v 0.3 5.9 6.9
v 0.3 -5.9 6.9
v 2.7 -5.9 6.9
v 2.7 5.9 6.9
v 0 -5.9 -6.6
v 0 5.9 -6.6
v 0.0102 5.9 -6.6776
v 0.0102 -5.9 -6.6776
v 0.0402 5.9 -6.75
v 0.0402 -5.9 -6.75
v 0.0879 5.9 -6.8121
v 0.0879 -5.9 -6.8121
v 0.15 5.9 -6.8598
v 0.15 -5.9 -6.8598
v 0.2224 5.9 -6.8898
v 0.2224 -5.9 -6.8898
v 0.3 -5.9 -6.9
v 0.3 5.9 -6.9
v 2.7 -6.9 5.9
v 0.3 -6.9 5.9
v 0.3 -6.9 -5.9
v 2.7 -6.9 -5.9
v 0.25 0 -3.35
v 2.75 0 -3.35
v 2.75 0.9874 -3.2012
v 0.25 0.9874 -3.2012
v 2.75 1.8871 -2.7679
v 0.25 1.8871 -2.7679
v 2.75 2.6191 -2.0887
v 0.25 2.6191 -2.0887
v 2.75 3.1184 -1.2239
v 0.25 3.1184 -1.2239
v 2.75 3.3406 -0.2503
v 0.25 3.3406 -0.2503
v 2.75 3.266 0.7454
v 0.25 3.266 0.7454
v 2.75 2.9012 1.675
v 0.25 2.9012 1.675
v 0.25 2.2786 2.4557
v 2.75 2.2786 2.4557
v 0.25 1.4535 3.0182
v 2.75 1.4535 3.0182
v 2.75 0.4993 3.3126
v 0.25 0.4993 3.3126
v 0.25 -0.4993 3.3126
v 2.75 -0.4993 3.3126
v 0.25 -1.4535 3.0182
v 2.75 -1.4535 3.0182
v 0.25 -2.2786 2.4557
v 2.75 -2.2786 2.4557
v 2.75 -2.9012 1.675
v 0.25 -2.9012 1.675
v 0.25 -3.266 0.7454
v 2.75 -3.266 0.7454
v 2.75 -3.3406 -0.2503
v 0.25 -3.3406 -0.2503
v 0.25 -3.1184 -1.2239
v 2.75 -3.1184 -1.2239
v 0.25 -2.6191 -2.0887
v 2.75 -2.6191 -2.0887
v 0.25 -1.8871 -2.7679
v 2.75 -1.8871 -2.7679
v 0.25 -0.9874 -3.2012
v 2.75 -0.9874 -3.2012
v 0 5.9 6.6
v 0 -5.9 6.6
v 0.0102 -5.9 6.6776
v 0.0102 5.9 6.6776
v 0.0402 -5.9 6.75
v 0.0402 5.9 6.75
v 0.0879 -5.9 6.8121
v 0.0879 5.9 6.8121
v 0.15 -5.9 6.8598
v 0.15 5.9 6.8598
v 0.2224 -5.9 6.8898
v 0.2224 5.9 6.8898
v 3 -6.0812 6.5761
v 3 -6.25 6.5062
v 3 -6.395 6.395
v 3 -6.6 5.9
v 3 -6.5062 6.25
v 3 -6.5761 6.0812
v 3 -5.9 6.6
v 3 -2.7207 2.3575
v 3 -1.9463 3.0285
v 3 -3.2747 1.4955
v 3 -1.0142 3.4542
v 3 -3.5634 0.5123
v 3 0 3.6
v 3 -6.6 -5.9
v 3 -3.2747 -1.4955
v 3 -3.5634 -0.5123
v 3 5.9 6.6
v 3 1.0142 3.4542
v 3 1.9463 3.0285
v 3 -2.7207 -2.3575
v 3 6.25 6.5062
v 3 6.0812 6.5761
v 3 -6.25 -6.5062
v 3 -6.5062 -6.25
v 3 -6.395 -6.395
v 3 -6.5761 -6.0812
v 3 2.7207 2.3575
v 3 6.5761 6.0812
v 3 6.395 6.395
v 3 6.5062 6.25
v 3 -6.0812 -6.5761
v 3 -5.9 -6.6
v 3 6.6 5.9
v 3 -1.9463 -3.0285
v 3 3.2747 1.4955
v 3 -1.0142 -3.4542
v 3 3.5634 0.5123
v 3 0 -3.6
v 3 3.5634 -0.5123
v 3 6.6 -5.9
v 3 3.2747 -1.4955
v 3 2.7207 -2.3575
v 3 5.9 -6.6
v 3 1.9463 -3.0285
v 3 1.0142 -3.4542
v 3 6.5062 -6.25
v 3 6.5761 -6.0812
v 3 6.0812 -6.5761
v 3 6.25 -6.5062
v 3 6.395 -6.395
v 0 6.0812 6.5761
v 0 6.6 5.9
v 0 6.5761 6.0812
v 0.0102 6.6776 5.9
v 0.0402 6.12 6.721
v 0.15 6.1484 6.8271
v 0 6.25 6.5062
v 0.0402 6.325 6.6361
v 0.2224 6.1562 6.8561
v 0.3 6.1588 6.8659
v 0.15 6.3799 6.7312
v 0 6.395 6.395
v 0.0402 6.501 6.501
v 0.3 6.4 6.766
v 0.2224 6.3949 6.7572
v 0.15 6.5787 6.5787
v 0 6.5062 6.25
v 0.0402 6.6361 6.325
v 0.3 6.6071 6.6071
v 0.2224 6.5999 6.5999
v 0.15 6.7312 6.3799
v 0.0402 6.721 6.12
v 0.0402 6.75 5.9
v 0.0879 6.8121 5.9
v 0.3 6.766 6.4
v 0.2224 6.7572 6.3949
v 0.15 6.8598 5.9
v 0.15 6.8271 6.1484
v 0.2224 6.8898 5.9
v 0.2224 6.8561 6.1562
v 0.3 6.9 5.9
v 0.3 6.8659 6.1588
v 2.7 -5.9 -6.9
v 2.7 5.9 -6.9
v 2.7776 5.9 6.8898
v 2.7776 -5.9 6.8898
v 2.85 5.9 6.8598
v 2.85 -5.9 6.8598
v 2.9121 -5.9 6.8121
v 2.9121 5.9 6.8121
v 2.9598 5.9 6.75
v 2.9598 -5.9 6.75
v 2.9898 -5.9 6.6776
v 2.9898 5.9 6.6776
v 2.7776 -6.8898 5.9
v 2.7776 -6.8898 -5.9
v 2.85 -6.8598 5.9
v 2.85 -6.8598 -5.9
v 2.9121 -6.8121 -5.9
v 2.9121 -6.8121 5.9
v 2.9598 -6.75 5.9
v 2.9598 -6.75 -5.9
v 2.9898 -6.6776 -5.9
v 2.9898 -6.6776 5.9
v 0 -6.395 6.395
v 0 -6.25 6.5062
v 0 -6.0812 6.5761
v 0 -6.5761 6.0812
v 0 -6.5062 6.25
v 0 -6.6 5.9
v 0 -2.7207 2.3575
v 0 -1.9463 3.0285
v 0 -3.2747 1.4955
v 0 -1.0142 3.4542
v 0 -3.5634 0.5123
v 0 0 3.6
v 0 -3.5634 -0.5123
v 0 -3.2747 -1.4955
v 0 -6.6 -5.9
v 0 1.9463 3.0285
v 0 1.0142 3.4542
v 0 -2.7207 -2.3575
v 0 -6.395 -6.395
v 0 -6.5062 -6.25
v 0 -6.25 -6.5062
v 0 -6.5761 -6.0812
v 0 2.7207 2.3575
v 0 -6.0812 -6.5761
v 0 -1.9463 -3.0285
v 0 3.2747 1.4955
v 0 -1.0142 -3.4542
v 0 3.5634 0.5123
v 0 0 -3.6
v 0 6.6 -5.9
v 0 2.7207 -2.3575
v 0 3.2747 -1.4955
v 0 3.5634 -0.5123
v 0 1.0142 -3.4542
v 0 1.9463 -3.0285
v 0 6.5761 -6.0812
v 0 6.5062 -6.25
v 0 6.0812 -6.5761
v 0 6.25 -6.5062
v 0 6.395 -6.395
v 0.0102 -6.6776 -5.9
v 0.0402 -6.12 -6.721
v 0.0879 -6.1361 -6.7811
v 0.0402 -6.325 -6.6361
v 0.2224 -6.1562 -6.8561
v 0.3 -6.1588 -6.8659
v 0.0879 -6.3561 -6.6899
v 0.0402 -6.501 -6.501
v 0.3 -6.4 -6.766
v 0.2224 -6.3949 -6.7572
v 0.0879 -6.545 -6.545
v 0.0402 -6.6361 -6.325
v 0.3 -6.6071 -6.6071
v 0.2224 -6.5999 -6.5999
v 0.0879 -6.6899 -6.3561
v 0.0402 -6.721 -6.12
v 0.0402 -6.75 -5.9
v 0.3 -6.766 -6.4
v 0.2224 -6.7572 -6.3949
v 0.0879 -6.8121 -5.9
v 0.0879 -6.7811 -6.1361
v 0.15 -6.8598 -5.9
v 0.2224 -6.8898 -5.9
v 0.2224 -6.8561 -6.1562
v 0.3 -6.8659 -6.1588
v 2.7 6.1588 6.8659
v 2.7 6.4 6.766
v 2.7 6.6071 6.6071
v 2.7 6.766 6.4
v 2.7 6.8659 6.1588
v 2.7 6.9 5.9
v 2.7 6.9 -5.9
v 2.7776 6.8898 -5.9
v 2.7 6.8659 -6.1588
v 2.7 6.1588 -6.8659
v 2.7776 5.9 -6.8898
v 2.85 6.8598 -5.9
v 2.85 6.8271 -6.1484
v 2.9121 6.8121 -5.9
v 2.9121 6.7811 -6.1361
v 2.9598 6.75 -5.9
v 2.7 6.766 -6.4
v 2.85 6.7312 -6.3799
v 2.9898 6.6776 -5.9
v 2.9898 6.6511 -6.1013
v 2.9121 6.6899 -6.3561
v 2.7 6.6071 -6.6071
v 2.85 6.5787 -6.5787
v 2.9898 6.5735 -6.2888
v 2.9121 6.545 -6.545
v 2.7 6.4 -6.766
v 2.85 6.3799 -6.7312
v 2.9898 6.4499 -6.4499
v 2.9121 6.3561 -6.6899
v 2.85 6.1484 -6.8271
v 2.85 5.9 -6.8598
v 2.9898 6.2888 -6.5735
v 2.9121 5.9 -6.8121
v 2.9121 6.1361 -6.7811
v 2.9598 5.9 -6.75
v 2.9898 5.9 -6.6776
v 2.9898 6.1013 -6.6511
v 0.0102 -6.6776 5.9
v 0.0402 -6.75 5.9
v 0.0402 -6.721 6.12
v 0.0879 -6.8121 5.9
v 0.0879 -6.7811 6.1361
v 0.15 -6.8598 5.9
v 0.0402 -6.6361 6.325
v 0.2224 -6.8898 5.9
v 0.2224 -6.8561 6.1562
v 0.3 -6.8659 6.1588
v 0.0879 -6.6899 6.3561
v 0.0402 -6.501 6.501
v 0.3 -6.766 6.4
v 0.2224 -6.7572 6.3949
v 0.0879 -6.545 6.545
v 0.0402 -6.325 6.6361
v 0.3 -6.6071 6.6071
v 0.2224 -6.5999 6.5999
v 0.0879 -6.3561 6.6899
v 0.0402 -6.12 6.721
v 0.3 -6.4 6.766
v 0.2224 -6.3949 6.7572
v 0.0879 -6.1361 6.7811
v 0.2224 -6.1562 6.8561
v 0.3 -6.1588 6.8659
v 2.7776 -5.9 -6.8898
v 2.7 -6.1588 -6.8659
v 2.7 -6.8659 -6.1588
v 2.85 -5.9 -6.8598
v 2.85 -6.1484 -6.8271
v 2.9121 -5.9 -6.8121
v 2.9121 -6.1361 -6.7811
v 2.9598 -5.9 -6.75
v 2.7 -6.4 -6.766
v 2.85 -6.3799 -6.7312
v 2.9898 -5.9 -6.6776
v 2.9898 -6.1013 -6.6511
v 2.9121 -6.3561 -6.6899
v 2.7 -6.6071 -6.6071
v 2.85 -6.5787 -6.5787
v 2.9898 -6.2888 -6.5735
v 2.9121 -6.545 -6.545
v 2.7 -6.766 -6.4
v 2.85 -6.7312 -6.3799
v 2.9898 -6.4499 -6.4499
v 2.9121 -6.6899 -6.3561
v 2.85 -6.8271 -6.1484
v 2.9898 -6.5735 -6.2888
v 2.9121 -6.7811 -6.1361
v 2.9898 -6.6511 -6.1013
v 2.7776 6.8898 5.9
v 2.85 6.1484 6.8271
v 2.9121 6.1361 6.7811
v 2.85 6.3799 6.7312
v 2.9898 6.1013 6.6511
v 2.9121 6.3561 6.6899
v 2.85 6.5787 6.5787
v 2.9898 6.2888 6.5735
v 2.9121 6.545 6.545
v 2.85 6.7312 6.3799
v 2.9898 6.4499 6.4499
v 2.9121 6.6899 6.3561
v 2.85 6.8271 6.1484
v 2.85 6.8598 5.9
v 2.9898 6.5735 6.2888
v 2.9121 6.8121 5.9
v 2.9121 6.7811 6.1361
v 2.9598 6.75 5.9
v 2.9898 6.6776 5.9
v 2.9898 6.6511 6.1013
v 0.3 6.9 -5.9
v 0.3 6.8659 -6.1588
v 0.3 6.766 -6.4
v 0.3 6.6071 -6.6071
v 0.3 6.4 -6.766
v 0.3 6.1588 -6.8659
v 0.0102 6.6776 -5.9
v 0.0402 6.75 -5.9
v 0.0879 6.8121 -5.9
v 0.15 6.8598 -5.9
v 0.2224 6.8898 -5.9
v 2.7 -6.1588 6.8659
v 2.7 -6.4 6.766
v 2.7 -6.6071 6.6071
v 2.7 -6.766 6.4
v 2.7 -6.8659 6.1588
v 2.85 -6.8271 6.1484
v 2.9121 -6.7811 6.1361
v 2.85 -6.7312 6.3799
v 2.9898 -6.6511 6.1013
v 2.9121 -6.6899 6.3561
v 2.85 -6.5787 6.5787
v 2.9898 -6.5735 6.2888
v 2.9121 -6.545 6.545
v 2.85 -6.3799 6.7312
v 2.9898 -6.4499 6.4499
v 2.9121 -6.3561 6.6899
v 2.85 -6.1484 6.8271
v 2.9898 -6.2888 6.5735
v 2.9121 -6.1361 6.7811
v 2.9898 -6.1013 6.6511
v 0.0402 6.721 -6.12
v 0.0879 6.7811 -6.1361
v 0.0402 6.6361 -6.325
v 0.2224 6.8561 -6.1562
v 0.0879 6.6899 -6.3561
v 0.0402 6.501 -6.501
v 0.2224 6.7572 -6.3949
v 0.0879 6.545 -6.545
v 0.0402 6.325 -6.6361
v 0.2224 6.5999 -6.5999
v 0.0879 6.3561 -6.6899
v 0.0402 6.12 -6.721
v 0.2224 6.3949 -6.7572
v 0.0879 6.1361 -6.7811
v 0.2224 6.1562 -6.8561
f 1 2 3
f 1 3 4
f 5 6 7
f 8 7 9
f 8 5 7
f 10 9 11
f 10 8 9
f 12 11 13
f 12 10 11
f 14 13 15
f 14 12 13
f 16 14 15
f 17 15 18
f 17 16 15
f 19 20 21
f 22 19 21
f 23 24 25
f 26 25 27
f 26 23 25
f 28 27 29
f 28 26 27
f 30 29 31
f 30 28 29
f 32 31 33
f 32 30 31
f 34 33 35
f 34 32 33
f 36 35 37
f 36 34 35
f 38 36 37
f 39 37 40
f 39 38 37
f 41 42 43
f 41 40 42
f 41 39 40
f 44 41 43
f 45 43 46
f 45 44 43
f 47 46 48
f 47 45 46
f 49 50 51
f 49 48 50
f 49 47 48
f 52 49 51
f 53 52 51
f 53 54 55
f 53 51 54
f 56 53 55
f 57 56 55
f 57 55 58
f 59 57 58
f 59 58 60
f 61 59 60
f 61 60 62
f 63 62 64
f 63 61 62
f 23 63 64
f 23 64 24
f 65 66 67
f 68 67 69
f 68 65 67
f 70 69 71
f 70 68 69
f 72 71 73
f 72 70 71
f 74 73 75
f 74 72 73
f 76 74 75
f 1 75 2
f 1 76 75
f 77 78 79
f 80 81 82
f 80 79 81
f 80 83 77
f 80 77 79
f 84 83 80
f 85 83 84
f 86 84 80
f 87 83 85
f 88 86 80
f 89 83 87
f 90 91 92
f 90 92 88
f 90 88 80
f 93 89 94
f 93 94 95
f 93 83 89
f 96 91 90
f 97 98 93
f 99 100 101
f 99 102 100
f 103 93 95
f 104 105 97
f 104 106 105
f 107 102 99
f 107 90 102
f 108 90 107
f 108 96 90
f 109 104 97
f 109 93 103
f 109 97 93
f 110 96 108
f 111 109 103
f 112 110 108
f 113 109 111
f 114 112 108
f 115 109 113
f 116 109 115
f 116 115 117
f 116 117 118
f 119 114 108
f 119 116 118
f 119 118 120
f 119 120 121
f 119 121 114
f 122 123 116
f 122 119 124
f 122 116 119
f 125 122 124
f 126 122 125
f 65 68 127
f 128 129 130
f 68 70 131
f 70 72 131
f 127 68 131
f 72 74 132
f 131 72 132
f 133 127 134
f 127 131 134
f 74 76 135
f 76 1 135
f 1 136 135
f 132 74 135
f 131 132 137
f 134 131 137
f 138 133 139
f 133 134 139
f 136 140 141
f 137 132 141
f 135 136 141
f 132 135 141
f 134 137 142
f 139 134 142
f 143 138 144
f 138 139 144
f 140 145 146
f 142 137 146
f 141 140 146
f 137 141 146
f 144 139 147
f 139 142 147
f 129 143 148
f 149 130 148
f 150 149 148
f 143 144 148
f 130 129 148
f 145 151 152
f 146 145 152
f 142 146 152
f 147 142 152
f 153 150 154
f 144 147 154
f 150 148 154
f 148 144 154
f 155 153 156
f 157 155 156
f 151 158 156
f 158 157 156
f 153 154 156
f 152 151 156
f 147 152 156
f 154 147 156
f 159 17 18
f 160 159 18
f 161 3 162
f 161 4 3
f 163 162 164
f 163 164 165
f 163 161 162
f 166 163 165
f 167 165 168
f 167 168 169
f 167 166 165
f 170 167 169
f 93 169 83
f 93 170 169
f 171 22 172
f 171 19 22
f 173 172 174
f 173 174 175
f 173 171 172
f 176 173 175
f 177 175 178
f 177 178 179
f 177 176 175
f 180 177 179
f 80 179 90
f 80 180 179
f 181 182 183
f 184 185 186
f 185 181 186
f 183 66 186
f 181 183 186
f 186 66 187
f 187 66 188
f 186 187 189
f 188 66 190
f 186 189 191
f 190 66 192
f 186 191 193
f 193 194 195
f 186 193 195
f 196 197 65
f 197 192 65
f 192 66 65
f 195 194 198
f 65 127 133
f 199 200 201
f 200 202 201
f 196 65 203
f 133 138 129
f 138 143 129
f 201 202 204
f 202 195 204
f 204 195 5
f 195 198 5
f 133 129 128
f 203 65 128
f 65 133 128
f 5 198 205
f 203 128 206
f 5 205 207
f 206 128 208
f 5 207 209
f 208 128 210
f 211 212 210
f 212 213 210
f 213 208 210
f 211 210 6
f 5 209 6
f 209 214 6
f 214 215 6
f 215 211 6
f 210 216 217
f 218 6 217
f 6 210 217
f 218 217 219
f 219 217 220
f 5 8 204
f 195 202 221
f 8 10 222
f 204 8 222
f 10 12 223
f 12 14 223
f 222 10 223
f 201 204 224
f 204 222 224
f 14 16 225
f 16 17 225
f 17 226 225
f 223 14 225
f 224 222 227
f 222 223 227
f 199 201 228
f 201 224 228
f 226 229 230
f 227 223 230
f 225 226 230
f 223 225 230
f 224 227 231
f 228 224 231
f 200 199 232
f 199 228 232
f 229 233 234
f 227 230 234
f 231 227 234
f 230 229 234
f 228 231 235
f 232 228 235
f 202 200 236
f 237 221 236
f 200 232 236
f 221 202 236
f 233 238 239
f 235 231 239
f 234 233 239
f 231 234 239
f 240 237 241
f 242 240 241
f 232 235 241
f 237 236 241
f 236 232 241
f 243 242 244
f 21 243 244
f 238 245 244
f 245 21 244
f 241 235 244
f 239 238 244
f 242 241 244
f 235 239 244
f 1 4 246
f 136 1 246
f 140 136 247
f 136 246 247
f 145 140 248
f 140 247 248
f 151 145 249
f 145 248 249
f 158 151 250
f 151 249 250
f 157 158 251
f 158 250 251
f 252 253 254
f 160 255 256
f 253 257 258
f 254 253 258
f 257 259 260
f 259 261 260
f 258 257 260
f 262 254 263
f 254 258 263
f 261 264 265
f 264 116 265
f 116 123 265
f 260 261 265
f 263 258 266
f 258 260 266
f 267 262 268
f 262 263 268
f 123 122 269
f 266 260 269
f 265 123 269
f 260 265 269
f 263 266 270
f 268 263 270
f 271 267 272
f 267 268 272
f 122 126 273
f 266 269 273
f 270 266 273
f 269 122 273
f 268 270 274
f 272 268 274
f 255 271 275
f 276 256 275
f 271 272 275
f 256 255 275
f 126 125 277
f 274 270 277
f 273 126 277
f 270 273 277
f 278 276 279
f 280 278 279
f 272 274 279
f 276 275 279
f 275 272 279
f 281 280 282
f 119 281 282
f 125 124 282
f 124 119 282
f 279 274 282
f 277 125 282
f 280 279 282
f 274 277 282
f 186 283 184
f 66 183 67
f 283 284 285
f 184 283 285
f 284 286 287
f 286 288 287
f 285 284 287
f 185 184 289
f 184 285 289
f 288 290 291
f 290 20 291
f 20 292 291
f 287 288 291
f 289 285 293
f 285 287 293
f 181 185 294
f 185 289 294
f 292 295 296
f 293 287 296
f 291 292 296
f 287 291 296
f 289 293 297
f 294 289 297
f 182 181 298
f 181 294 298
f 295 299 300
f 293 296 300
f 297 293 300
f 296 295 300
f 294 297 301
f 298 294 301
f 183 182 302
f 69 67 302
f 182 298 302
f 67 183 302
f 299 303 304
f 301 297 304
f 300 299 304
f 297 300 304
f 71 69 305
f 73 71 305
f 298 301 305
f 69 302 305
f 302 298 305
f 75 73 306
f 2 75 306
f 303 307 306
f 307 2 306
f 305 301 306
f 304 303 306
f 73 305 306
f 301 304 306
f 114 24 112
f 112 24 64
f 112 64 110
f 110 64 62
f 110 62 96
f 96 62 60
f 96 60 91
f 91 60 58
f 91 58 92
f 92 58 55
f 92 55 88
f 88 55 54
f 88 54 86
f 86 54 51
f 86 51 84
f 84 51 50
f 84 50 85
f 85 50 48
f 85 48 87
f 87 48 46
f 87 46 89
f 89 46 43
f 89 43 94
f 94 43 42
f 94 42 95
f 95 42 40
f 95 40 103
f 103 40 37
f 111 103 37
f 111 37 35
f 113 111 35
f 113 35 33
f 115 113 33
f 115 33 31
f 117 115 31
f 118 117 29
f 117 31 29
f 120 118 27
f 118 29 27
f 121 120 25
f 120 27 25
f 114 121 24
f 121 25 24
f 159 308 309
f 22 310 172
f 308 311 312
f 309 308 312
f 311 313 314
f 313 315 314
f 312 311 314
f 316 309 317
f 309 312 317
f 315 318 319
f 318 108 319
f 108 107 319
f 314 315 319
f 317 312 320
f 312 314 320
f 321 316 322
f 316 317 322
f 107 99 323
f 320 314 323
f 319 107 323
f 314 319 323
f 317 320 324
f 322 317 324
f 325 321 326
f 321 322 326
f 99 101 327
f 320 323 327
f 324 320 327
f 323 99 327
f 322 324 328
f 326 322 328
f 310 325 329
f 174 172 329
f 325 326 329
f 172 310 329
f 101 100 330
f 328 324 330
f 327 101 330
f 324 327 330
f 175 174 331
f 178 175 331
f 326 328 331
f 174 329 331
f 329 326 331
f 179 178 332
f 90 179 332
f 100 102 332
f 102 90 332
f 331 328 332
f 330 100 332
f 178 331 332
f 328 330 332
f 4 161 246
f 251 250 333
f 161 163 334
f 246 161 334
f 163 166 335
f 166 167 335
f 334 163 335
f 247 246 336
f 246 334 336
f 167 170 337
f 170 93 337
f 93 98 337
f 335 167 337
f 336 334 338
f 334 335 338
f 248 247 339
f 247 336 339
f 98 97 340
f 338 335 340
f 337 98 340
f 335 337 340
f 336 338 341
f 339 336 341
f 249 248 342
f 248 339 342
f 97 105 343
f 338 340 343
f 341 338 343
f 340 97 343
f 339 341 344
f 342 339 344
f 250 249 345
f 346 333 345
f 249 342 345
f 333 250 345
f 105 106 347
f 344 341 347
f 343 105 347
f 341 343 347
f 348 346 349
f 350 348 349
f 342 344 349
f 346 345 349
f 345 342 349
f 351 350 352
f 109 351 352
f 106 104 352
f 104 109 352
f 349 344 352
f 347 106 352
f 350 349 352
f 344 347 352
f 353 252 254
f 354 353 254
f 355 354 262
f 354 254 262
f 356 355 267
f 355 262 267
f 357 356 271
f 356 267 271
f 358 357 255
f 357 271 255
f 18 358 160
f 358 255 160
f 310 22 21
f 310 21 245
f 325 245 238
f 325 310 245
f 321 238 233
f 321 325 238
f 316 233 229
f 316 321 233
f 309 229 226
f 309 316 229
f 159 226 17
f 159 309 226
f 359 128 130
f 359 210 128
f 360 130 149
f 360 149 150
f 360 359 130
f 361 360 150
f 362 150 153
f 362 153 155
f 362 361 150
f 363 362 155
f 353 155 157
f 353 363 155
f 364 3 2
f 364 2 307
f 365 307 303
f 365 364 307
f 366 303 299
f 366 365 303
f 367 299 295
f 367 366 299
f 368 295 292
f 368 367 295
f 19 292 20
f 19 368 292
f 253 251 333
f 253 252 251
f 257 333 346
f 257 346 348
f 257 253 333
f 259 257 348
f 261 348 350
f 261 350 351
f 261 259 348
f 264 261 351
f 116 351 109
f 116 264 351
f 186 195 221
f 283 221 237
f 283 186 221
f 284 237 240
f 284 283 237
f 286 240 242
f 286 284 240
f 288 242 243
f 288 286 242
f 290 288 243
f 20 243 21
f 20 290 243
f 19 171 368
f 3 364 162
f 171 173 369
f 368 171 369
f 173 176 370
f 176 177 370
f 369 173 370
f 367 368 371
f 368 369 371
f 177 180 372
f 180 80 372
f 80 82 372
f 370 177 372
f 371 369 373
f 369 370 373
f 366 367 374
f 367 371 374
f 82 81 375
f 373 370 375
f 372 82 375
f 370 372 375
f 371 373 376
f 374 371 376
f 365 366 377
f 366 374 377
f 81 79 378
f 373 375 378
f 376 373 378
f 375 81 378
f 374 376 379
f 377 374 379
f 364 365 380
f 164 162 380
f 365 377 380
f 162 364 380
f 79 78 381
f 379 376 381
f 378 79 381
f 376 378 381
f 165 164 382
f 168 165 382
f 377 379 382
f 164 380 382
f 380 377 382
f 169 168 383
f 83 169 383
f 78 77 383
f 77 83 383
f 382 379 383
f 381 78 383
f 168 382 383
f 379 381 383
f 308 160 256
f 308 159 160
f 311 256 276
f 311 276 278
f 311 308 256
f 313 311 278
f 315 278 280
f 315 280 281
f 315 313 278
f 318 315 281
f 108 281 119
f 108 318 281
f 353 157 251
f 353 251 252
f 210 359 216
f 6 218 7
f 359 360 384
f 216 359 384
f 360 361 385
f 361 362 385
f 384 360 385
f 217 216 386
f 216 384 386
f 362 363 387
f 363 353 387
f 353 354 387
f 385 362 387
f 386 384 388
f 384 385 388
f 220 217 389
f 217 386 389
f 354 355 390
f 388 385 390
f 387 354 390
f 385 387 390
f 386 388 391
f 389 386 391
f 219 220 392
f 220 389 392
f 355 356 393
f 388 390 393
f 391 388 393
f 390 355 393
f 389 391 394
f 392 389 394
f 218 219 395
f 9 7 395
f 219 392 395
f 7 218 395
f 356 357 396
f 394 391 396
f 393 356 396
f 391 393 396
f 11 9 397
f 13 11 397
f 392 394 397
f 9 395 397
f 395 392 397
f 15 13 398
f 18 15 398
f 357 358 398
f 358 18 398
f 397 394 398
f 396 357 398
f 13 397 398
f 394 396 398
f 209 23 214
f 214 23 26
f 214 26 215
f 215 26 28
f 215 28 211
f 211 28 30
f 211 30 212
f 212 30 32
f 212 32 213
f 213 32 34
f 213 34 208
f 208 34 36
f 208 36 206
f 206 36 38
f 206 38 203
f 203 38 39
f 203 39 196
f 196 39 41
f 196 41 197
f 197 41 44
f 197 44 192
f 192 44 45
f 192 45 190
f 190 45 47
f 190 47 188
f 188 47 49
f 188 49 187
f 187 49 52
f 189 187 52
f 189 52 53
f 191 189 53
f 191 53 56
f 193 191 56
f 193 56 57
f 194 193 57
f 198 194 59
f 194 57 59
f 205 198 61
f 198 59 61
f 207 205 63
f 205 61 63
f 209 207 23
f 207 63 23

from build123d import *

# Parameters (mm, degrees)
SKETCH1_W           = 13.8
SKETCH1_H           = 13.8
BOSS_EXTRUDE1_DEPTH = 3
SKETCH2_R           = 3.35
CUT_EXTRUDE1_DEPTH  = 4
CHAMFER1_SIZE       = 0.25
FILLET1_R           = 1
FILLET2_R           = 0.3


with BuildPart() as part:
    # Sketch1 → Boss-Extrude1 (new body)
    with BuildSketch(Plane(origin=(0, 0, 0), x_dir=(0, 0, -1), z_dir=(1, 0, 0))):
        Rectangle(SKETCH1_W, SKETCH1_H)
    extrude(amount=BOSS_EXTRUDE1_DEPTH)

    # Sketch2 → Cut-Extrude1 (cut, through all)
    with BuildSketch(Plane(origin=(0, 0, 0), x_dir=(0, 0, -1), z_dir=(1, 0, 0))):
        Circle(SKETCH2_R)
    extrude(amount=CUT_EXTRUDE1_DEPTH, mode=Mode.SUBTRACT)

    # Chamfer1
    chamfer1_edges = [part.edges().sort_by_distance(p)[0] for p in [
        (0, 0, 3.35),
        (3, 0, 3.35),
    ]]
    chamfer(chamfer1_edges, length=CHAMFER1_SIZE)

    # Fillet1
    fillet1_edges = [part.edges().sort_by_distance(p)[0] for p in [
        (1.5, 6.9, 6.9),
        (1.5, 6.9, -6.9),
        (1.5, -6.9, -6.9),
        (1.5, -6.9, 6.9),
    ]]
    fillet(fillet1_edges, radius=FILLET1_R)

    # Fillet2
    fillet2_edges = [part.edges().sort_by_distance(p)[0] for p in [
        (0, 6.9, 0),
        (3, 6.9, 0),
        (0, 0, 6.9),
        (0, 0, -6.9),
        (0, -6.9, 0),
        (0, 6.607106781, 6.607106781),
        (0, -6.607106781, 6.607106781),
        (0, -6.607106781, -6.607106781),
        (0, 6.607106781, -6.607106781),
        (3, 0, -6.9),
        (3, 0, 6.9),
        (3, -6.9, 0),
        (3, 6.607106781, 6.607106781),
        (3, -6.607106781, 6.607106781),
        (3, -6.607106781, -6.607106781),
        (3, 6.607106781, -6.607106781),
    ]]
    fillet(fillet2_edges, radius=FILLET2_R)


solid = part.part
